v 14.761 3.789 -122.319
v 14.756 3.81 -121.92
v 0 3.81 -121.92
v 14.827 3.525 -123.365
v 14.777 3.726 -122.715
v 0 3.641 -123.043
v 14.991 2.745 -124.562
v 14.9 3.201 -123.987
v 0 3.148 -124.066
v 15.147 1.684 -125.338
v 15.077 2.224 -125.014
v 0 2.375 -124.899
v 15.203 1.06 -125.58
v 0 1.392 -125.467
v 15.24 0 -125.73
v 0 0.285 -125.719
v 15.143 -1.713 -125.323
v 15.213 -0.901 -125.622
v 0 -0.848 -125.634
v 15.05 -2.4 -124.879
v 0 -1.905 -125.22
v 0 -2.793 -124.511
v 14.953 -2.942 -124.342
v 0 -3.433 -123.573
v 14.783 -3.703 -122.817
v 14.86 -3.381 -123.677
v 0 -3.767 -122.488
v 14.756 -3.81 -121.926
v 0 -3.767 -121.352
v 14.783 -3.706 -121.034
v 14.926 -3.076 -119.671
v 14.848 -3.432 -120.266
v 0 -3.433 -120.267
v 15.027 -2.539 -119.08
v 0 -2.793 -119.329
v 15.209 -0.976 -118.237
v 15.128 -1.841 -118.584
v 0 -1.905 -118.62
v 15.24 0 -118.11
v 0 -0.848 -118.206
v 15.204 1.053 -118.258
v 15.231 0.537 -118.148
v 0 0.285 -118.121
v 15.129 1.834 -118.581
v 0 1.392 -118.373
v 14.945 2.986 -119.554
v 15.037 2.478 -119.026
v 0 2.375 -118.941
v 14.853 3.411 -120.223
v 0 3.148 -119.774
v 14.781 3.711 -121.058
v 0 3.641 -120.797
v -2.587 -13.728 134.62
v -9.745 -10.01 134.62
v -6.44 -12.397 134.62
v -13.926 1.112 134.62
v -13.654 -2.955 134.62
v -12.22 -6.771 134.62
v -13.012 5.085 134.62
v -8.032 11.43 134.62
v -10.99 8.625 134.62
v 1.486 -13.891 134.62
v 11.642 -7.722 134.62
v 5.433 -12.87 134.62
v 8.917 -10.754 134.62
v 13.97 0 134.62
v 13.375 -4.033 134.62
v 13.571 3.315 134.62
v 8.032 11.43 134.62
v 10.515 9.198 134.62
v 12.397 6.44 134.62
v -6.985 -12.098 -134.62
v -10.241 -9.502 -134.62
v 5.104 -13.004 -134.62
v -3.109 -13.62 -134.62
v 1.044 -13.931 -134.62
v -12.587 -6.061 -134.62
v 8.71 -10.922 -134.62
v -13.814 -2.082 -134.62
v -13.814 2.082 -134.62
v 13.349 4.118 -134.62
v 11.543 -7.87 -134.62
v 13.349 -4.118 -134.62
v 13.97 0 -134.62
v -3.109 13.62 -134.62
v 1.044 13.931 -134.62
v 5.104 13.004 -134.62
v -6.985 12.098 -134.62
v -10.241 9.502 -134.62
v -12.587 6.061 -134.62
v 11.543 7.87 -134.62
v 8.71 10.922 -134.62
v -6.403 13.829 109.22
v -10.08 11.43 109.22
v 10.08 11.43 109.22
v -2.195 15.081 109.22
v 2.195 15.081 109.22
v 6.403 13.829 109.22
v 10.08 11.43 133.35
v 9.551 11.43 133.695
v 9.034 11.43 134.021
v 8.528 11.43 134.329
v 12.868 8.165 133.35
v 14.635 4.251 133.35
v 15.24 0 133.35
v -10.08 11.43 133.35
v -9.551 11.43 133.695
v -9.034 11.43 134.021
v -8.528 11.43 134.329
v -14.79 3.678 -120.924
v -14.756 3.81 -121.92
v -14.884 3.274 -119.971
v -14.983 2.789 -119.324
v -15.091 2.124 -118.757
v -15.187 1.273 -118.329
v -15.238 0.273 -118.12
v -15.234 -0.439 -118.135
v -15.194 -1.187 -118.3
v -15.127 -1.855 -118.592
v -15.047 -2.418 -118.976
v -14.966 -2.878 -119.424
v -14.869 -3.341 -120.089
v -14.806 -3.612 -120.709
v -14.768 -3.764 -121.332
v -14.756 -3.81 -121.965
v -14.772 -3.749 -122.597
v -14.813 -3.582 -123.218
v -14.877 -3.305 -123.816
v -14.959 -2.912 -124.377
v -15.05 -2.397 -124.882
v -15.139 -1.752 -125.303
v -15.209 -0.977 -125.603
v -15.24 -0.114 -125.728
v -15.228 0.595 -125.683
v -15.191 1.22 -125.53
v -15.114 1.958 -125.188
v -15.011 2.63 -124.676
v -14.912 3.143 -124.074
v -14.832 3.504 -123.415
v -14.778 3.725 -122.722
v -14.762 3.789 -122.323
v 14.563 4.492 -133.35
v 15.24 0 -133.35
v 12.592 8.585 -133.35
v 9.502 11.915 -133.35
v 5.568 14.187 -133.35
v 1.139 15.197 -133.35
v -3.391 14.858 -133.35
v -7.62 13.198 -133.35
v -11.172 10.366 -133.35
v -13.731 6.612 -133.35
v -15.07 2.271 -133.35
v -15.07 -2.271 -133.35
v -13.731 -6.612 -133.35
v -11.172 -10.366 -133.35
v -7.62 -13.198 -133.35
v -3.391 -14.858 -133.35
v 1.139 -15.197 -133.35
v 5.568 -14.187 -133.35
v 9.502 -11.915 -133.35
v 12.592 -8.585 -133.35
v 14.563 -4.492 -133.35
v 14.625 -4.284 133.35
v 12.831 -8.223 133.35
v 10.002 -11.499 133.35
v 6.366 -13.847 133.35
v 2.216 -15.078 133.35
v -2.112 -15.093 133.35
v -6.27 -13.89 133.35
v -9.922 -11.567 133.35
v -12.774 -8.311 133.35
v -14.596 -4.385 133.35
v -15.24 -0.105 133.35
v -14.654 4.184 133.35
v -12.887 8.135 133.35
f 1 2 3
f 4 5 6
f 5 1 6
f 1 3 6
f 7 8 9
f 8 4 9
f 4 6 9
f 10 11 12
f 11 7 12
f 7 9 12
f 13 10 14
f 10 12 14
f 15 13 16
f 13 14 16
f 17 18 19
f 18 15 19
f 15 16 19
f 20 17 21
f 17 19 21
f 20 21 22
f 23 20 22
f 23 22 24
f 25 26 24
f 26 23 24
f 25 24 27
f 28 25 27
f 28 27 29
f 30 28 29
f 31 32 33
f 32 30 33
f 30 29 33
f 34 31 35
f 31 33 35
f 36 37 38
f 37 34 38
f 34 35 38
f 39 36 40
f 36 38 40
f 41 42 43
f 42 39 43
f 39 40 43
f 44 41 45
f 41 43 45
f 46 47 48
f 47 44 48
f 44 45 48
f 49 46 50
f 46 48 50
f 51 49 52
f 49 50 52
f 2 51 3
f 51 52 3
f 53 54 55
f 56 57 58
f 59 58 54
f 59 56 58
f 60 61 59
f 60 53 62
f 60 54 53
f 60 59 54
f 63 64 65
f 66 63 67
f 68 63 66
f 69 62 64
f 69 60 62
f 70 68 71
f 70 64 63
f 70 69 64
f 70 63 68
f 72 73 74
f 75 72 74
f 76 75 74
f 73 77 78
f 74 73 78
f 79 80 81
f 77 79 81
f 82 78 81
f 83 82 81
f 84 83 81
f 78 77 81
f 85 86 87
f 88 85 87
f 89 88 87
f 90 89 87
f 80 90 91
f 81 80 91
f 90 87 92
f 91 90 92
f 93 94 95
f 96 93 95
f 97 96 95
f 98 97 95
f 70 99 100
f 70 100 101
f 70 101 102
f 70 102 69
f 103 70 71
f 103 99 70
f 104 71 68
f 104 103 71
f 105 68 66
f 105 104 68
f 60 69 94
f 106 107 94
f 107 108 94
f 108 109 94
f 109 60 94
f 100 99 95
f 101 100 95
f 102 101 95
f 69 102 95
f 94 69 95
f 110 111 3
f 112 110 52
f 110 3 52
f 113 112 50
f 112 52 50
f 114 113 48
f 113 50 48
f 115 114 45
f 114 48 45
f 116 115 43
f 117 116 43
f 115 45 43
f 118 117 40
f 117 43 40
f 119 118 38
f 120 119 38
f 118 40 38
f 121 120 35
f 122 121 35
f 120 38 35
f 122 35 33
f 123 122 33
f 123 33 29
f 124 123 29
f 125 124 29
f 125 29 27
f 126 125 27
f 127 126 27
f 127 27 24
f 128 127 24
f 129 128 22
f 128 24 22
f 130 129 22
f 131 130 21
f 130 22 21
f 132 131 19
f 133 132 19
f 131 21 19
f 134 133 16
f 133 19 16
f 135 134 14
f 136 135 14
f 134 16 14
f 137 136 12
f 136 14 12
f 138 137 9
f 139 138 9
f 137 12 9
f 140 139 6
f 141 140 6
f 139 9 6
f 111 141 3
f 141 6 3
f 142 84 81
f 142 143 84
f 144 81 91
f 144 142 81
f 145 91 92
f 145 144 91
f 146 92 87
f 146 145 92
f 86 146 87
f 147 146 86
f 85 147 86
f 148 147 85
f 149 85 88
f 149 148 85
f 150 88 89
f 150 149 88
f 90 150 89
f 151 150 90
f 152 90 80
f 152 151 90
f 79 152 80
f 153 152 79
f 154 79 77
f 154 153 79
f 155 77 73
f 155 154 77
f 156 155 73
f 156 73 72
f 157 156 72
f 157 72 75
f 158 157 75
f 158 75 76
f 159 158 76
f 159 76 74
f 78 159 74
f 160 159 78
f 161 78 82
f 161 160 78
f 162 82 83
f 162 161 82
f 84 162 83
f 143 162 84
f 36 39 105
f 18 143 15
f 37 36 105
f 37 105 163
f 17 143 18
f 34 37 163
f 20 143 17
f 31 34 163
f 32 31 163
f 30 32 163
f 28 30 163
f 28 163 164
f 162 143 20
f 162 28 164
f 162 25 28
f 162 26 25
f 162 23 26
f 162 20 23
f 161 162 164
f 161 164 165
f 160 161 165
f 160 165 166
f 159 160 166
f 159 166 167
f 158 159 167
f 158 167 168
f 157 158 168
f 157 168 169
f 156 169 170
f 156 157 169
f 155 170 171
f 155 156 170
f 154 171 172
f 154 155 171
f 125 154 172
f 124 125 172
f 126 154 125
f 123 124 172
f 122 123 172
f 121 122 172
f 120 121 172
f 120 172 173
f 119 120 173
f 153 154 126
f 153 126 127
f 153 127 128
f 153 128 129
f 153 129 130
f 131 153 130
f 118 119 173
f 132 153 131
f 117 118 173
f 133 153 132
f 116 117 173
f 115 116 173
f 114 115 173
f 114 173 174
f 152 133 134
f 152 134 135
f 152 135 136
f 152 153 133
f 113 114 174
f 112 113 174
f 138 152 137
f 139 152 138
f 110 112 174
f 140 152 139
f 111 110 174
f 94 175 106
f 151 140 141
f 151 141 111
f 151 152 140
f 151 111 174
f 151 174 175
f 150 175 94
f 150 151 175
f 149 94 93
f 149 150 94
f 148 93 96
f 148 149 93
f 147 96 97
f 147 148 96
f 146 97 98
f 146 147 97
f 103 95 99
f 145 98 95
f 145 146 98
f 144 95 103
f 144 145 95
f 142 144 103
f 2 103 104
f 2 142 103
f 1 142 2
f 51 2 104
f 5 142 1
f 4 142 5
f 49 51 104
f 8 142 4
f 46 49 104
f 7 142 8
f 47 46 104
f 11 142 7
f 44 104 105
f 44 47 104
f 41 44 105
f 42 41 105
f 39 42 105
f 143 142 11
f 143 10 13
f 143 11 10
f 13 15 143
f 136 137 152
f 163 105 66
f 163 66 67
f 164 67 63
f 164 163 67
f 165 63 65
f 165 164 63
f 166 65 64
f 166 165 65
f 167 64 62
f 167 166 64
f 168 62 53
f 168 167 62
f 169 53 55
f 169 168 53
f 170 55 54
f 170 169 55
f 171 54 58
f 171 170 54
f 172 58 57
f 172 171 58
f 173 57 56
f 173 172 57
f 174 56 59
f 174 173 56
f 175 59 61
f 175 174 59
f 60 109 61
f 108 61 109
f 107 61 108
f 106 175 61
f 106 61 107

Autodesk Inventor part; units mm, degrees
ref_plane "YZ Plane" through (0, 0, 0) normal (1, 0, 0) x (0, 1, 0)
ref_plane "XZ Plane" through (0, 0, 0) normal (0, 1, 0) x (-1, 0, 0)
ref_plane "XY Plane" through (0, 0, 0) normal (0, 0, 1) x (1, 0, 0)
sketch "Sketch1" plane through (0, 0, 0) normal (0, 0, 1) x (1, 0, 0)
  circle A0 centre (0, 0) radius 15.24
  dimension "d0" = 30.48
extrude "Extrusion1" add sketch "Sketch1" along normal mid plane 269.24
sketch "Sketch2" plane through (0, 0, 0) normal (1, 0, 0) x (0, 1, 0)
  line L0 (15.24, -134.62) -> (-15.24, -134.62) projected
  line L1 (-15.24, -134.62) -> (-15.24, 134.62) projected
  line L2 (-15.24, 134.62) -> (15.24, 134.62) projected
  line L3 (15.24, 134.62) -> (15.24, -134.62) projected
  line L4 (-15.24, -134.62) -> (15.24, -134.62) projected
  line L5 (15.24, 134.62) -> (-15.24, 134.62) projected
  circle A0 centre (0, -121.92) radius 3.81
  line L6 (19.558, 134.62) -> (11.43, 134.62)
  line L7 (11.43, 134.62) -> (11.43, 109.22)
  line L8 (11.43, 109.22) -> (19.558, 109.22)
  line L9 (19.558, 109.22) -> (19.558, 134.62)
  line L10 (0, -188.468) -> (0, 188.468) projected
  point P0 (0, 0)
  dimension "d3" = 7.62
  dimension "d4" = 12.7
  dimension "d5" = 8.128
  dimension "d6" = 25.4
  dimension "d7" = 11.43
extrude "Extrusion2" cut sketch "Sketch2" against normal through all both and the other way through all contours L8 L7 L2 L3 | L3 L6 L9 L8 | L10 A0 | A0 L10
chamfer "Chamfer1" distance 1.27 angle 45 3 edges at (13.8903, 6.2703, 134.62) (-6.2703, -13.8903, 134.62) (-15.24, 0, -134.62) measured on face at (-13.538, 6.9987, 44.8733)
equation "\"BendRadius\" = Thickness"
equation "\"BendReliefWidth\" = Thickness"
equation "\"BendReliefDepth\" = 0.5 * Thickness"
equation "\"CornerReliefSize\" = 4 * Thickness"
equation "\"MinimumRemnant\" = 2 * Thickness"
equation "\"TransitionRadius\" = BendRadius"
equation "\"JacobiRadiusSize\" = BendRadius"
equation "\"GapSize\" = Thickness"
equation "\"Thickness\" = 3.048"
properties part number "crankshaft" material "Stainless Steel"
